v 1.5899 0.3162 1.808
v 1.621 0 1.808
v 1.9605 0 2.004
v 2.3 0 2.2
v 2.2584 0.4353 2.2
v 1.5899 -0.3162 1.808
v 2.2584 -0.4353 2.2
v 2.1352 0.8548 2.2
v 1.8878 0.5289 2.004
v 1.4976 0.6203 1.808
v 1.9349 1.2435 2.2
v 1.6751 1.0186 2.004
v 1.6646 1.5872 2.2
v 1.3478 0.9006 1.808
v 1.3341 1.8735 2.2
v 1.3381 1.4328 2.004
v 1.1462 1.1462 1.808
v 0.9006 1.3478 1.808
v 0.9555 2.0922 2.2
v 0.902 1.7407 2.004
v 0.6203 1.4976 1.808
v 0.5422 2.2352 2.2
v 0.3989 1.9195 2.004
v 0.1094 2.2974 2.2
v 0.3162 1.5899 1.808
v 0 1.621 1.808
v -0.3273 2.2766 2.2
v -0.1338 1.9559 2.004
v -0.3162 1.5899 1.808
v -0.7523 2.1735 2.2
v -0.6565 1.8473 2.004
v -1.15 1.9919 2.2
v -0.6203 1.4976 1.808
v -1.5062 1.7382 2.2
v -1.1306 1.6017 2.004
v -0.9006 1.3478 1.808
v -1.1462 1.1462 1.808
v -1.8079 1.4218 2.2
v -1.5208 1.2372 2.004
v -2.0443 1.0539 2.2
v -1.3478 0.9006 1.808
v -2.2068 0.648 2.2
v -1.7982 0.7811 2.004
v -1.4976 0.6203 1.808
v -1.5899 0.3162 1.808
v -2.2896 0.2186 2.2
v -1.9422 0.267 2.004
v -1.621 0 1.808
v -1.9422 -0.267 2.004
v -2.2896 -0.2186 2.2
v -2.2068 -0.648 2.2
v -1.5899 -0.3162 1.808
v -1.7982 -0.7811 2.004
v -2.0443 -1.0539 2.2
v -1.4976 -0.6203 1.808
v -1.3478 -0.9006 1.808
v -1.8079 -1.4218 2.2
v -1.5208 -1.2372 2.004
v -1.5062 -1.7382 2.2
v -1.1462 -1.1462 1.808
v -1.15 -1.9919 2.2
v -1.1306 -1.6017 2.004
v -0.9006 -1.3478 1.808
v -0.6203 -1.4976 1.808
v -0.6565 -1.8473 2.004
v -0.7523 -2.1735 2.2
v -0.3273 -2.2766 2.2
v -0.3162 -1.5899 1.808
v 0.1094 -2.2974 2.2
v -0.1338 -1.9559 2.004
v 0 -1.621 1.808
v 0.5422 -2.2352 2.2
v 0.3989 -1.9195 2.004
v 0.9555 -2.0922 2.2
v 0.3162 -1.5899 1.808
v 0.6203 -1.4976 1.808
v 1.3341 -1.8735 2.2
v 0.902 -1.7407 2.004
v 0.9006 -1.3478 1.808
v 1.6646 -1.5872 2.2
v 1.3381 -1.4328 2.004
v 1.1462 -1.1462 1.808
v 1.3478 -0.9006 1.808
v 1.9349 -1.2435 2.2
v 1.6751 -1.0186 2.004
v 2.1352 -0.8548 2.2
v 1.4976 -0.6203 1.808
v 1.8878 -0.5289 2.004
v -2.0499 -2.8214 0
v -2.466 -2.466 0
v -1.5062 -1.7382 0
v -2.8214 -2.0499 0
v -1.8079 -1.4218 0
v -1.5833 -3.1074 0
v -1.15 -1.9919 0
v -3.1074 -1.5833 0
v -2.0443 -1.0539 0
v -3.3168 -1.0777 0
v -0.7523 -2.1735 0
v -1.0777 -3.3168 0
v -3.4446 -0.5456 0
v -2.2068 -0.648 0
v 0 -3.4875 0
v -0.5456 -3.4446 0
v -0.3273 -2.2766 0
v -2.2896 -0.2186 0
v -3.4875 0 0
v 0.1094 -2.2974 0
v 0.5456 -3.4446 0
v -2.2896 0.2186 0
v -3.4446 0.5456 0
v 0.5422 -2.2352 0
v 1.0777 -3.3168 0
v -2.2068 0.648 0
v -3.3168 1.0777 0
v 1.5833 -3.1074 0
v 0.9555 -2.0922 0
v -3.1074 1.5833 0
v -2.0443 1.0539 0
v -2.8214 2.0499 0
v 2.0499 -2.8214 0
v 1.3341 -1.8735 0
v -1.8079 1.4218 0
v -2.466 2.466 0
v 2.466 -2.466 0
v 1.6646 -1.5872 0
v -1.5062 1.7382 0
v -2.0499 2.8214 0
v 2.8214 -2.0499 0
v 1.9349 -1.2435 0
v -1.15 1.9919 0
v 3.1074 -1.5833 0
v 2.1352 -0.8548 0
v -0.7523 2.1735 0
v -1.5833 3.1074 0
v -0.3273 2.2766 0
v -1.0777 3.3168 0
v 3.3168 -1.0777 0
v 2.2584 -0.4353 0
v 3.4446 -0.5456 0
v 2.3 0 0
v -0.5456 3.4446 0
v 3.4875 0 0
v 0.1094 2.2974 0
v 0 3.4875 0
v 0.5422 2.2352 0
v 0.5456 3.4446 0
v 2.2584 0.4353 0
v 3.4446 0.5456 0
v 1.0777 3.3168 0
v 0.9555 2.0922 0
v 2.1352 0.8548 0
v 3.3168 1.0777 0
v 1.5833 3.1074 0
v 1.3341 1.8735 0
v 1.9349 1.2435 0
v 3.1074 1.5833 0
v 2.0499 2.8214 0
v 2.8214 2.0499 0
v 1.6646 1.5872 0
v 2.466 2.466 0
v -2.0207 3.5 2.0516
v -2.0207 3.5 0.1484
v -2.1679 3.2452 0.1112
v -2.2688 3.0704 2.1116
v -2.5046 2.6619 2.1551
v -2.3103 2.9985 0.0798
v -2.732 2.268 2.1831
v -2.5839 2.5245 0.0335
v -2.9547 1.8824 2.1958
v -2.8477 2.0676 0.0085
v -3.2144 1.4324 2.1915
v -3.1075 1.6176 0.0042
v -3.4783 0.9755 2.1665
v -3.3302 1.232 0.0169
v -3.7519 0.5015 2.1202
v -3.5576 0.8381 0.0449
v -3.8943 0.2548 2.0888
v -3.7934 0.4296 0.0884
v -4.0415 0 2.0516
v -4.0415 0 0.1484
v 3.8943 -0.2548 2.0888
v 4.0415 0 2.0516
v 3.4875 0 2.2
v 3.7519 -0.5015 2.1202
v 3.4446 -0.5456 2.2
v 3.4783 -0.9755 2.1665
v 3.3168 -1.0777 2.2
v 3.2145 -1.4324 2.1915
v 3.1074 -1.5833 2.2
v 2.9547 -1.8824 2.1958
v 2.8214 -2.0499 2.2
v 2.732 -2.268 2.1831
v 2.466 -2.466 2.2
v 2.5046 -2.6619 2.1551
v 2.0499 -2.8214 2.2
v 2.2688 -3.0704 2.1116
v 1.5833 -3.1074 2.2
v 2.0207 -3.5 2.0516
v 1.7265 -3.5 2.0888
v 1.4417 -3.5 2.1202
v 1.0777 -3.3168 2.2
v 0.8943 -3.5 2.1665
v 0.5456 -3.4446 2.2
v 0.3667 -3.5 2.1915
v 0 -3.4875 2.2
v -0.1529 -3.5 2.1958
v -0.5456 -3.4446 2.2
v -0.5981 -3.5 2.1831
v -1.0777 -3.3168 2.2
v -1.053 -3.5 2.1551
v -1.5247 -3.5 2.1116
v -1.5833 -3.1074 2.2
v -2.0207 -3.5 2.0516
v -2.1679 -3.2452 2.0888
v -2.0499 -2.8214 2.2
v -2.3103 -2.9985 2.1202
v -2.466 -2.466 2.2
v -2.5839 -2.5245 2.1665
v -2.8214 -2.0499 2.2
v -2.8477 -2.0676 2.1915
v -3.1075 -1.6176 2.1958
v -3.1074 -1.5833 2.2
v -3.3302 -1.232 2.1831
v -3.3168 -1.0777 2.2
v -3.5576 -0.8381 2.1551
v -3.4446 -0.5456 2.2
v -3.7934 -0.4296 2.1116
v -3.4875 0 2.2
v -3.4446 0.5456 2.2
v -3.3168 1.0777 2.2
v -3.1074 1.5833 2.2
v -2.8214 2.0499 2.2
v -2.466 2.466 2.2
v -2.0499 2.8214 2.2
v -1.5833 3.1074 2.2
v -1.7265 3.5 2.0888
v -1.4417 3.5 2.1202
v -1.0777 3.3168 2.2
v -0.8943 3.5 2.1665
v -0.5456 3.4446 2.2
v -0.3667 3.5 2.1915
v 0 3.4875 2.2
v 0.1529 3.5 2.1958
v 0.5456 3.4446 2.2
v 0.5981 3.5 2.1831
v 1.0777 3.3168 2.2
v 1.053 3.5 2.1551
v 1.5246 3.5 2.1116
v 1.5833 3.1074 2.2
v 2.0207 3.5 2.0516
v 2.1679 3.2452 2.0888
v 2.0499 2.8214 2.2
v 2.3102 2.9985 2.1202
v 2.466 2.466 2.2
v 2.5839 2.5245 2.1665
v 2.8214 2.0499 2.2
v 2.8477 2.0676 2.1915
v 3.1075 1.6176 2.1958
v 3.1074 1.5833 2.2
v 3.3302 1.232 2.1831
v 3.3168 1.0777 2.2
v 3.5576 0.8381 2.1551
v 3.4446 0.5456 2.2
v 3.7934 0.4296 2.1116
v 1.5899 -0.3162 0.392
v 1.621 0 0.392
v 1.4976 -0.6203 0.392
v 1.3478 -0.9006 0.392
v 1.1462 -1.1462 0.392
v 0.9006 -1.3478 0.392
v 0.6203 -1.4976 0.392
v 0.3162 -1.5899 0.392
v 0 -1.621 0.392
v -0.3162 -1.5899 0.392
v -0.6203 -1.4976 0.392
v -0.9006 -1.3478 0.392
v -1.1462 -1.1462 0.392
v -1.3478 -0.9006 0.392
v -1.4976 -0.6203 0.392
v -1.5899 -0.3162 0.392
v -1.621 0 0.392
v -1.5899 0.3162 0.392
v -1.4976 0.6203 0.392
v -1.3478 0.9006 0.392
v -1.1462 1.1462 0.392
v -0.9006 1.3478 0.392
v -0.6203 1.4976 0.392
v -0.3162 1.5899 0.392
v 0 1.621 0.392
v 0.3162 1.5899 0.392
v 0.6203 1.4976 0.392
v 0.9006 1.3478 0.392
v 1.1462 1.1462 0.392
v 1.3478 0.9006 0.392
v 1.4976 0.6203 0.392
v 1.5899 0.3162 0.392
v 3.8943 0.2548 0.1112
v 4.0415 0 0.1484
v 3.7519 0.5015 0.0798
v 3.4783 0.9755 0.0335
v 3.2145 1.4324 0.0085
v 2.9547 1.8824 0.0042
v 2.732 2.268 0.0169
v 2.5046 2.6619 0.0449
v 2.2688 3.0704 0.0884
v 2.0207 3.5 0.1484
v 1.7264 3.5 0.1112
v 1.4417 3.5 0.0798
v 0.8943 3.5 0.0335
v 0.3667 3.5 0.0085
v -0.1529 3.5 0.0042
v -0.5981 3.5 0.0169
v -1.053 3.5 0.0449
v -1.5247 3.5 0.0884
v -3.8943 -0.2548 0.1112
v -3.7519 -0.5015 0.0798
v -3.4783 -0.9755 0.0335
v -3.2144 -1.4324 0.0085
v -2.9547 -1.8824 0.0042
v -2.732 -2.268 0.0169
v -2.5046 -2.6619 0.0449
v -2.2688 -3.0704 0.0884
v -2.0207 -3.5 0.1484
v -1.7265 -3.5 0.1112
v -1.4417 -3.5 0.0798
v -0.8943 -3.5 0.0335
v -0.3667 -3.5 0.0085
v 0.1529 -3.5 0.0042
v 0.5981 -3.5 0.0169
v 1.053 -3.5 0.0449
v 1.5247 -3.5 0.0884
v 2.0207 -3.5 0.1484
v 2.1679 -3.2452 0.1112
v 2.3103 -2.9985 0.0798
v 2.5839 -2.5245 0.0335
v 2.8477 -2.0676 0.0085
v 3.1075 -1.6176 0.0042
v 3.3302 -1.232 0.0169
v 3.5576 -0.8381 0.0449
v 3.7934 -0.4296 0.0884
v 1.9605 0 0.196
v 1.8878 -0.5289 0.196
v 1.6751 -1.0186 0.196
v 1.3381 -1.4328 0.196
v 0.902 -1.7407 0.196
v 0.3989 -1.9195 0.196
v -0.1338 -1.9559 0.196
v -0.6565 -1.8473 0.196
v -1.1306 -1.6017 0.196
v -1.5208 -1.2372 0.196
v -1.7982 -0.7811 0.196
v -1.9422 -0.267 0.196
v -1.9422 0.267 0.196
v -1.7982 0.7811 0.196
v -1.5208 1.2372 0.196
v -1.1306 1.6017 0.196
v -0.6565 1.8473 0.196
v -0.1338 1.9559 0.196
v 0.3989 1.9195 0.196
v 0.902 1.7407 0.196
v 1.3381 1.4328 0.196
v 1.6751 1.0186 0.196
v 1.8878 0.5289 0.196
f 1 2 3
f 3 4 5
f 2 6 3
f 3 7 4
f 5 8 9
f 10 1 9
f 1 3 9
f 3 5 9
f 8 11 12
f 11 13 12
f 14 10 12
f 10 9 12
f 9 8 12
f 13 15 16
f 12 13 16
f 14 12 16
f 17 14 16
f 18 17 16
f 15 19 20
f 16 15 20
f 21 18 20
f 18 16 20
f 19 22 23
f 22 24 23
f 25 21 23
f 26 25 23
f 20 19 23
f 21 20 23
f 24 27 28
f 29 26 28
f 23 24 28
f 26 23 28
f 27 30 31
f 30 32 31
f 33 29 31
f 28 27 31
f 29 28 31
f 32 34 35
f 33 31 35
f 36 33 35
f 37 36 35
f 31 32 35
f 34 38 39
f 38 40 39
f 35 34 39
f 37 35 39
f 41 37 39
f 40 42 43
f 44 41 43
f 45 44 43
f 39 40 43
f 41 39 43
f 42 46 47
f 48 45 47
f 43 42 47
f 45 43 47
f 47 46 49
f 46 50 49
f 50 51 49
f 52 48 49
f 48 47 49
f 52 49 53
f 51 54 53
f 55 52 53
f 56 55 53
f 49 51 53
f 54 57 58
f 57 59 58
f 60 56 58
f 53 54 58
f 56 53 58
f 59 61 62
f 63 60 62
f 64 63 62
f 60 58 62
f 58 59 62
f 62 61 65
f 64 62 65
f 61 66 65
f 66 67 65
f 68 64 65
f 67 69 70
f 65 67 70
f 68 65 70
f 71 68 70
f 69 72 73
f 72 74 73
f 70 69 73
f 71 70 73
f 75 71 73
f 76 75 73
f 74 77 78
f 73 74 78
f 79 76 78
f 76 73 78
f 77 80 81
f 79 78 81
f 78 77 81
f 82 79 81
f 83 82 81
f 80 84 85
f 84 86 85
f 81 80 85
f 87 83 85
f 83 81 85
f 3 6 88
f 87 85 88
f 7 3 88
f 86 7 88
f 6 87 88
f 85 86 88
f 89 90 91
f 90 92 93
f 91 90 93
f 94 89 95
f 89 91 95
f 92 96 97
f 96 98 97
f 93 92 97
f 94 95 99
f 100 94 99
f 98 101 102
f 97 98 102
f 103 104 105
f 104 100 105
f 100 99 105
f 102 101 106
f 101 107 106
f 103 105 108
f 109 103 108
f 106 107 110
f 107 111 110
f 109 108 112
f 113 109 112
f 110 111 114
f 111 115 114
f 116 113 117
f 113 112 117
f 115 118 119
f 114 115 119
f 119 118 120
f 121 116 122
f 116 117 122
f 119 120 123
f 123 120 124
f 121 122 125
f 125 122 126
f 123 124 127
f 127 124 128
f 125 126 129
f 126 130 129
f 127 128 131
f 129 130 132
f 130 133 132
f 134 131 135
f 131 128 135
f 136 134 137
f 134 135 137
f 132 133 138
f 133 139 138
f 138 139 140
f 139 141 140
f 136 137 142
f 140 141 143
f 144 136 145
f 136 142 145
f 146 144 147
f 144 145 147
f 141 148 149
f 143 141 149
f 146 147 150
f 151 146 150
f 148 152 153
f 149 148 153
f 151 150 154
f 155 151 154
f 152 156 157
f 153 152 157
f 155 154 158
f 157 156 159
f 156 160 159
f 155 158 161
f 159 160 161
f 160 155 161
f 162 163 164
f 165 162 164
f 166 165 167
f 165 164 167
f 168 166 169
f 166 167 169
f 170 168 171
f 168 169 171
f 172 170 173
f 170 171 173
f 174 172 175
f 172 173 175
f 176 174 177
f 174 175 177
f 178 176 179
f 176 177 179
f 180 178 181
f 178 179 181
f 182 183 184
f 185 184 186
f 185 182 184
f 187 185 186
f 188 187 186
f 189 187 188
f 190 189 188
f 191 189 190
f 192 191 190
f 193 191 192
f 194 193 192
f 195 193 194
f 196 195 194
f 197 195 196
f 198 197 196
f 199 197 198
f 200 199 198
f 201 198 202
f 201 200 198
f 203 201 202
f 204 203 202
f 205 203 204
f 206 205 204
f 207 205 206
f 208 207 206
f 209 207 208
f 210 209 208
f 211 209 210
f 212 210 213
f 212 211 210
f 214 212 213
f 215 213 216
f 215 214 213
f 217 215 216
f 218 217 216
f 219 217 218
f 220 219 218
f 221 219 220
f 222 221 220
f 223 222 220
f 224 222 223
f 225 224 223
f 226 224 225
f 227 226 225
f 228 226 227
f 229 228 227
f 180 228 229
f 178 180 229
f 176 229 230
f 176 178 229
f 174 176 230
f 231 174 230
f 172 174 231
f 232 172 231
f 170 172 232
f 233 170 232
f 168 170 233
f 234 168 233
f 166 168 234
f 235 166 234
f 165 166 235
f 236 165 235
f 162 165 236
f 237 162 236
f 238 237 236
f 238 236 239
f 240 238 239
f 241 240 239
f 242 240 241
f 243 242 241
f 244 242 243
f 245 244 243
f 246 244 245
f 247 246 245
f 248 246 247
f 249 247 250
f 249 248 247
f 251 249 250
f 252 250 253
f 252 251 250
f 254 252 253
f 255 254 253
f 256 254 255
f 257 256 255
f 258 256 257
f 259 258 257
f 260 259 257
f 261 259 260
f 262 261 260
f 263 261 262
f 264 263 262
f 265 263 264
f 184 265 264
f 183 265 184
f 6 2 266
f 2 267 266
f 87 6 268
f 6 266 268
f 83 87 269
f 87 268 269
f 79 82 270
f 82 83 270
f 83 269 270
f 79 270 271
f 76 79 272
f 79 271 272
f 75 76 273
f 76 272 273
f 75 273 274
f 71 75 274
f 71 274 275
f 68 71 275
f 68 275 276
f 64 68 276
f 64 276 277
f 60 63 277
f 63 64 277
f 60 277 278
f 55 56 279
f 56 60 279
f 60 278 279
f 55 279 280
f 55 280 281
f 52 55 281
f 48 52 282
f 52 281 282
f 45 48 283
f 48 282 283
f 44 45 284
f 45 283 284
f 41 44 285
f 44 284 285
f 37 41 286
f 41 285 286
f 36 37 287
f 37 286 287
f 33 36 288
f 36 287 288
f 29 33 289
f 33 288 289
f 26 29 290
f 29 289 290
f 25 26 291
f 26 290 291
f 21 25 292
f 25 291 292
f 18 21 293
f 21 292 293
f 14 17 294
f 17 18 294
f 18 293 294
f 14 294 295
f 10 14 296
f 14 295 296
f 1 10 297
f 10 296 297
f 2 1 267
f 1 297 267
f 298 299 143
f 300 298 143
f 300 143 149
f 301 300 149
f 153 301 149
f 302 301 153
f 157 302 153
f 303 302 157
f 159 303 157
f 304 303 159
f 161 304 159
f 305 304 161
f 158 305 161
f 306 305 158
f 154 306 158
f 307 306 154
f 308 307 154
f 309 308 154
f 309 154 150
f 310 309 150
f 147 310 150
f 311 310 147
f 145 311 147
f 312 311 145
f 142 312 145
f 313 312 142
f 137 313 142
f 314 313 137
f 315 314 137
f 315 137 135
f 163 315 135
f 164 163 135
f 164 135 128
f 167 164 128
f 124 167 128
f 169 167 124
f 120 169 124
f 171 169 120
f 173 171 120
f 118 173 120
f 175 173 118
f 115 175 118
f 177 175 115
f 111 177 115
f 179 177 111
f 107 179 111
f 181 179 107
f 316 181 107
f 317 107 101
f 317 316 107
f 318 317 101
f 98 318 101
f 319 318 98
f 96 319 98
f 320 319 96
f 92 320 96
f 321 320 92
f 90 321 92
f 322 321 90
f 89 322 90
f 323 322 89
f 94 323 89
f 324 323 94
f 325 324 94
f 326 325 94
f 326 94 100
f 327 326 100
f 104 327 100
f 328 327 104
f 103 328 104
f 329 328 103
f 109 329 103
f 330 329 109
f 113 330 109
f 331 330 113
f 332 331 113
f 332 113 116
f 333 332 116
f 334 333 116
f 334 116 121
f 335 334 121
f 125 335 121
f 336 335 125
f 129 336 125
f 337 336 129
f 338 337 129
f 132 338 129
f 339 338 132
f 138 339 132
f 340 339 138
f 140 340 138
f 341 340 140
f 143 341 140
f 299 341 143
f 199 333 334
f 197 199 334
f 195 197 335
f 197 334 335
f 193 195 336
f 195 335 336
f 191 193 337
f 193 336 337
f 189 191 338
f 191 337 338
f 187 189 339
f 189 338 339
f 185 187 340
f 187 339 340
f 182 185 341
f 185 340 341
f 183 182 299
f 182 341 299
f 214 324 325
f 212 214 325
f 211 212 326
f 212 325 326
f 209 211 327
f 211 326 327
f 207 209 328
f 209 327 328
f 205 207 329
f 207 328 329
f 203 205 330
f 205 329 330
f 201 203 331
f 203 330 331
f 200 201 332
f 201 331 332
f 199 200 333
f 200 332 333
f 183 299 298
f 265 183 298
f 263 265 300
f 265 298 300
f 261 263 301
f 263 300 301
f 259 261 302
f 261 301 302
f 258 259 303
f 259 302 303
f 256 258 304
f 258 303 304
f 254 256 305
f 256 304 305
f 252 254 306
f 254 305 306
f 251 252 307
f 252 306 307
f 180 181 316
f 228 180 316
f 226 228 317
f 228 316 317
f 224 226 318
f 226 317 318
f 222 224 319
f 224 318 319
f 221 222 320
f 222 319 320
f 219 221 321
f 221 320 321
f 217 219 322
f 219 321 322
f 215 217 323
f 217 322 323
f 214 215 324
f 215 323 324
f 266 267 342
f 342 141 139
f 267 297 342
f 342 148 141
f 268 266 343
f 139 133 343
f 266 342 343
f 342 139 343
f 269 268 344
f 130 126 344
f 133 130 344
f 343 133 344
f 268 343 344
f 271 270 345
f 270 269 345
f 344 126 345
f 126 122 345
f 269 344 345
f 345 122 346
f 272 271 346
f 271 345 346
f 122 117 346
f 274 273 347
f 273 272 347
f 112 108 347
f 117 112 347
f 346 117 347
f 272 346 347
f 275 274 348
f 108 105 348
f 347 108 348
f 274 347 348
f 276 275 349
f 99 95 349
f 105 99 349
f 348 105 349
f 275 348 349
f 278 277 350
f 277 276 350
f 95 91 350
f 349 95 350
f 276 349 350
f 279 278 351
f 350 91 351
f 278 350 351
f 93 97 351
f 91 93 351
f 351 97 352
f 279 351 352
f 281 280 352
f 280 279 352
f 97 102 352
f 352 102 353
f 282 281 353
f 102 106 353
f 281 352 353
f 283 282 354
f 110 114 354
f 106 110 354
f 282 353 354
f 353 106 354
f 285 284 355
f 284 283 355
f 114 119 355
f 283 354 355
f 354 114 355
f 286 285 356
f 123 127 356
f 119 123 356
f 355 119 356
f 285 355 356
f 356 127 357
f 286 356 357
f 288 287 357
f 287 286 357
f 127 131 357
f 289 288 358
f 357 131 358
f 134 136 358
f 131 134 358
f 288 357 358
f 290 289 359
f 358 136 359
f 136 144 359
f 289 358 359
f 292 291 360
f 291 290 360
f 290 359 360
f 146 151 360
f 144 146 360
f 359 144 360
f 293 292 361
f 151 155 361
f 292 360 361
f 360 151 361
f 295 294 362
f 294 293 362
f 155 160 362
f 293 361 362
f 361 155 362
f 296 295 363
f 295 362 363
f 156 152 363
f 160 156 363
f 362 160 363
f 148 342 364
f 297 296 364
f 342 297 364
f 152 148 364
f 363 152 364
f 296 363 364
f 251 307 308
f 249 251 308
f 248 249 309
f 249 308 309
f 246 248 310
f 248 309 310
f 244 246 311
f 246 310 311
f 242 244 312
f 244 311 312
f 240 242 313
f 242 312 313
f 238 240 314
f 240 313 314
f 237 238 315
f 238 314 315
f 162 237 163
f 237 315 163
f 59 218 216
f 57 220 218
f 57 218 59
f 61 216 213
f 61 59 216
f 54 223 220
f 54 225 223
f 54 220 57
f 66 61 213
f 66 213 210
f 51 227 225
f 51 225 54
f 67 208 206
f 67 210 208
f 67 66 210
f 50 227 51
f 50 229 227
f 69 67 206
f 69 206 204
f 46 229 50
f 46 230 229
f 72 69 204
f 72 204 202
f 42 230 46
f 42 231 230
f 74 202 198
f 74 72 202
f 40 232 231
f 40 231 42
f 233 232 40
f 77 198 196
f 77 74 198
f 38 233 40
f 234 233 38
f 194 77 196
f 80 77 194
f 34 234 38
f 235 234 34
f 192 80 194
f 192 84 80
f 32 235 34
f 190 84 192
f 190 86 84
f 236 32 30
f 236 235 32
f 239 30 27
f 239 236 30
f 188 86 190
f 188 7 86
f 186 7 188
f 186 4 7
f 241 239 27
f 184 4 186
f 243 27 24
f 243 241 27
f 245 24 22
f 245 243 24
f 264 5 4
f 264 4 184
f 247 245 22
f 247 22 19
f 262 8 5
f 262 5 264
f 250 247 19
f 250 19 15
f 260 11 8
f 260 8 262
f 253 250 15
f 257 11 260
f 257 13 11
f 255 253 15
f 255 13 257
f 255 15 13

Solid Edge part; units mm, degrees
sketch "Sketch1" plane through (0, 0, 0) normal (0, 0, 1) x (1, 0, 0)
  circle A0 centre (0, 0) radius 1.621
  circle A1 centre (0, 0) radius 4.0415
  dimension "D1" = 3.5
  dimension "D2" = 3.242
extrude "Protrusion1" add sketch "Sketch1" along normal blind 2.2
sketch "Sketch2" plane through (0, 0, 0) normal (0, 0, 1) x (1, 0, 0)
  line L0 (4.0415, 0) -> (2.0207, 3.5)
  arc A0 (2.0207, 3.5) -> (4.0415, 0) centre (0, 0) cw
  dimension "D1" = 3.5
extrude "ExtrudedCutout_1" cut sketch "Sketch2" along normal blind 2.2
pattern_circular "Pattern1" count 6 over 360 about axis through (0, 0, 0) along (0, 0, -1) of "ExtrudedCutout_1"
cosmetic_thread "Thread_1" size "M4" thread depth 2.2
sketch "Sketch3" plane through (0, 0, 0) normal (0, -1, 0) x (1, 0, 0)
  line L0 (4.0415, 0.1484) -> (3.4875, 0)
  line L1 (3.4875, 0) -> (4.0415, 0)
  line L2 (4.0415, 0) -> (4.0415, 0.1484)
  line L3 (3.4875, 2.2) -> (4.0415, 2.2)
  line L4 (4.0415, 2.2) -> (4.0415, 2.0516)
  line L5 (4.0415, 2.0516) -> (3.4875, 2.2)
  dimension "D1" = 2.2
  dimension "D2" = 3.4875
  dimension "D3" = 4.0415
revolve "RevolvedCutout_1" cut sketch "Sketch3" angle 360 about axis through (0, 0, 8.4) along (0, 0, -1)
chamfer "Chamfer_1" distance 0.679 angle 30 1 edges at (-1.621, 0, 0) measured on face at (-2.3947, -2.2552, 0)
chamfer "Chamfer_2" distance 0.679 angle 30 1 edges at (-1.621, 0, 2.2) measured on face at (-2.3947, -2.2552, 2.2)
properties material "Steel"
